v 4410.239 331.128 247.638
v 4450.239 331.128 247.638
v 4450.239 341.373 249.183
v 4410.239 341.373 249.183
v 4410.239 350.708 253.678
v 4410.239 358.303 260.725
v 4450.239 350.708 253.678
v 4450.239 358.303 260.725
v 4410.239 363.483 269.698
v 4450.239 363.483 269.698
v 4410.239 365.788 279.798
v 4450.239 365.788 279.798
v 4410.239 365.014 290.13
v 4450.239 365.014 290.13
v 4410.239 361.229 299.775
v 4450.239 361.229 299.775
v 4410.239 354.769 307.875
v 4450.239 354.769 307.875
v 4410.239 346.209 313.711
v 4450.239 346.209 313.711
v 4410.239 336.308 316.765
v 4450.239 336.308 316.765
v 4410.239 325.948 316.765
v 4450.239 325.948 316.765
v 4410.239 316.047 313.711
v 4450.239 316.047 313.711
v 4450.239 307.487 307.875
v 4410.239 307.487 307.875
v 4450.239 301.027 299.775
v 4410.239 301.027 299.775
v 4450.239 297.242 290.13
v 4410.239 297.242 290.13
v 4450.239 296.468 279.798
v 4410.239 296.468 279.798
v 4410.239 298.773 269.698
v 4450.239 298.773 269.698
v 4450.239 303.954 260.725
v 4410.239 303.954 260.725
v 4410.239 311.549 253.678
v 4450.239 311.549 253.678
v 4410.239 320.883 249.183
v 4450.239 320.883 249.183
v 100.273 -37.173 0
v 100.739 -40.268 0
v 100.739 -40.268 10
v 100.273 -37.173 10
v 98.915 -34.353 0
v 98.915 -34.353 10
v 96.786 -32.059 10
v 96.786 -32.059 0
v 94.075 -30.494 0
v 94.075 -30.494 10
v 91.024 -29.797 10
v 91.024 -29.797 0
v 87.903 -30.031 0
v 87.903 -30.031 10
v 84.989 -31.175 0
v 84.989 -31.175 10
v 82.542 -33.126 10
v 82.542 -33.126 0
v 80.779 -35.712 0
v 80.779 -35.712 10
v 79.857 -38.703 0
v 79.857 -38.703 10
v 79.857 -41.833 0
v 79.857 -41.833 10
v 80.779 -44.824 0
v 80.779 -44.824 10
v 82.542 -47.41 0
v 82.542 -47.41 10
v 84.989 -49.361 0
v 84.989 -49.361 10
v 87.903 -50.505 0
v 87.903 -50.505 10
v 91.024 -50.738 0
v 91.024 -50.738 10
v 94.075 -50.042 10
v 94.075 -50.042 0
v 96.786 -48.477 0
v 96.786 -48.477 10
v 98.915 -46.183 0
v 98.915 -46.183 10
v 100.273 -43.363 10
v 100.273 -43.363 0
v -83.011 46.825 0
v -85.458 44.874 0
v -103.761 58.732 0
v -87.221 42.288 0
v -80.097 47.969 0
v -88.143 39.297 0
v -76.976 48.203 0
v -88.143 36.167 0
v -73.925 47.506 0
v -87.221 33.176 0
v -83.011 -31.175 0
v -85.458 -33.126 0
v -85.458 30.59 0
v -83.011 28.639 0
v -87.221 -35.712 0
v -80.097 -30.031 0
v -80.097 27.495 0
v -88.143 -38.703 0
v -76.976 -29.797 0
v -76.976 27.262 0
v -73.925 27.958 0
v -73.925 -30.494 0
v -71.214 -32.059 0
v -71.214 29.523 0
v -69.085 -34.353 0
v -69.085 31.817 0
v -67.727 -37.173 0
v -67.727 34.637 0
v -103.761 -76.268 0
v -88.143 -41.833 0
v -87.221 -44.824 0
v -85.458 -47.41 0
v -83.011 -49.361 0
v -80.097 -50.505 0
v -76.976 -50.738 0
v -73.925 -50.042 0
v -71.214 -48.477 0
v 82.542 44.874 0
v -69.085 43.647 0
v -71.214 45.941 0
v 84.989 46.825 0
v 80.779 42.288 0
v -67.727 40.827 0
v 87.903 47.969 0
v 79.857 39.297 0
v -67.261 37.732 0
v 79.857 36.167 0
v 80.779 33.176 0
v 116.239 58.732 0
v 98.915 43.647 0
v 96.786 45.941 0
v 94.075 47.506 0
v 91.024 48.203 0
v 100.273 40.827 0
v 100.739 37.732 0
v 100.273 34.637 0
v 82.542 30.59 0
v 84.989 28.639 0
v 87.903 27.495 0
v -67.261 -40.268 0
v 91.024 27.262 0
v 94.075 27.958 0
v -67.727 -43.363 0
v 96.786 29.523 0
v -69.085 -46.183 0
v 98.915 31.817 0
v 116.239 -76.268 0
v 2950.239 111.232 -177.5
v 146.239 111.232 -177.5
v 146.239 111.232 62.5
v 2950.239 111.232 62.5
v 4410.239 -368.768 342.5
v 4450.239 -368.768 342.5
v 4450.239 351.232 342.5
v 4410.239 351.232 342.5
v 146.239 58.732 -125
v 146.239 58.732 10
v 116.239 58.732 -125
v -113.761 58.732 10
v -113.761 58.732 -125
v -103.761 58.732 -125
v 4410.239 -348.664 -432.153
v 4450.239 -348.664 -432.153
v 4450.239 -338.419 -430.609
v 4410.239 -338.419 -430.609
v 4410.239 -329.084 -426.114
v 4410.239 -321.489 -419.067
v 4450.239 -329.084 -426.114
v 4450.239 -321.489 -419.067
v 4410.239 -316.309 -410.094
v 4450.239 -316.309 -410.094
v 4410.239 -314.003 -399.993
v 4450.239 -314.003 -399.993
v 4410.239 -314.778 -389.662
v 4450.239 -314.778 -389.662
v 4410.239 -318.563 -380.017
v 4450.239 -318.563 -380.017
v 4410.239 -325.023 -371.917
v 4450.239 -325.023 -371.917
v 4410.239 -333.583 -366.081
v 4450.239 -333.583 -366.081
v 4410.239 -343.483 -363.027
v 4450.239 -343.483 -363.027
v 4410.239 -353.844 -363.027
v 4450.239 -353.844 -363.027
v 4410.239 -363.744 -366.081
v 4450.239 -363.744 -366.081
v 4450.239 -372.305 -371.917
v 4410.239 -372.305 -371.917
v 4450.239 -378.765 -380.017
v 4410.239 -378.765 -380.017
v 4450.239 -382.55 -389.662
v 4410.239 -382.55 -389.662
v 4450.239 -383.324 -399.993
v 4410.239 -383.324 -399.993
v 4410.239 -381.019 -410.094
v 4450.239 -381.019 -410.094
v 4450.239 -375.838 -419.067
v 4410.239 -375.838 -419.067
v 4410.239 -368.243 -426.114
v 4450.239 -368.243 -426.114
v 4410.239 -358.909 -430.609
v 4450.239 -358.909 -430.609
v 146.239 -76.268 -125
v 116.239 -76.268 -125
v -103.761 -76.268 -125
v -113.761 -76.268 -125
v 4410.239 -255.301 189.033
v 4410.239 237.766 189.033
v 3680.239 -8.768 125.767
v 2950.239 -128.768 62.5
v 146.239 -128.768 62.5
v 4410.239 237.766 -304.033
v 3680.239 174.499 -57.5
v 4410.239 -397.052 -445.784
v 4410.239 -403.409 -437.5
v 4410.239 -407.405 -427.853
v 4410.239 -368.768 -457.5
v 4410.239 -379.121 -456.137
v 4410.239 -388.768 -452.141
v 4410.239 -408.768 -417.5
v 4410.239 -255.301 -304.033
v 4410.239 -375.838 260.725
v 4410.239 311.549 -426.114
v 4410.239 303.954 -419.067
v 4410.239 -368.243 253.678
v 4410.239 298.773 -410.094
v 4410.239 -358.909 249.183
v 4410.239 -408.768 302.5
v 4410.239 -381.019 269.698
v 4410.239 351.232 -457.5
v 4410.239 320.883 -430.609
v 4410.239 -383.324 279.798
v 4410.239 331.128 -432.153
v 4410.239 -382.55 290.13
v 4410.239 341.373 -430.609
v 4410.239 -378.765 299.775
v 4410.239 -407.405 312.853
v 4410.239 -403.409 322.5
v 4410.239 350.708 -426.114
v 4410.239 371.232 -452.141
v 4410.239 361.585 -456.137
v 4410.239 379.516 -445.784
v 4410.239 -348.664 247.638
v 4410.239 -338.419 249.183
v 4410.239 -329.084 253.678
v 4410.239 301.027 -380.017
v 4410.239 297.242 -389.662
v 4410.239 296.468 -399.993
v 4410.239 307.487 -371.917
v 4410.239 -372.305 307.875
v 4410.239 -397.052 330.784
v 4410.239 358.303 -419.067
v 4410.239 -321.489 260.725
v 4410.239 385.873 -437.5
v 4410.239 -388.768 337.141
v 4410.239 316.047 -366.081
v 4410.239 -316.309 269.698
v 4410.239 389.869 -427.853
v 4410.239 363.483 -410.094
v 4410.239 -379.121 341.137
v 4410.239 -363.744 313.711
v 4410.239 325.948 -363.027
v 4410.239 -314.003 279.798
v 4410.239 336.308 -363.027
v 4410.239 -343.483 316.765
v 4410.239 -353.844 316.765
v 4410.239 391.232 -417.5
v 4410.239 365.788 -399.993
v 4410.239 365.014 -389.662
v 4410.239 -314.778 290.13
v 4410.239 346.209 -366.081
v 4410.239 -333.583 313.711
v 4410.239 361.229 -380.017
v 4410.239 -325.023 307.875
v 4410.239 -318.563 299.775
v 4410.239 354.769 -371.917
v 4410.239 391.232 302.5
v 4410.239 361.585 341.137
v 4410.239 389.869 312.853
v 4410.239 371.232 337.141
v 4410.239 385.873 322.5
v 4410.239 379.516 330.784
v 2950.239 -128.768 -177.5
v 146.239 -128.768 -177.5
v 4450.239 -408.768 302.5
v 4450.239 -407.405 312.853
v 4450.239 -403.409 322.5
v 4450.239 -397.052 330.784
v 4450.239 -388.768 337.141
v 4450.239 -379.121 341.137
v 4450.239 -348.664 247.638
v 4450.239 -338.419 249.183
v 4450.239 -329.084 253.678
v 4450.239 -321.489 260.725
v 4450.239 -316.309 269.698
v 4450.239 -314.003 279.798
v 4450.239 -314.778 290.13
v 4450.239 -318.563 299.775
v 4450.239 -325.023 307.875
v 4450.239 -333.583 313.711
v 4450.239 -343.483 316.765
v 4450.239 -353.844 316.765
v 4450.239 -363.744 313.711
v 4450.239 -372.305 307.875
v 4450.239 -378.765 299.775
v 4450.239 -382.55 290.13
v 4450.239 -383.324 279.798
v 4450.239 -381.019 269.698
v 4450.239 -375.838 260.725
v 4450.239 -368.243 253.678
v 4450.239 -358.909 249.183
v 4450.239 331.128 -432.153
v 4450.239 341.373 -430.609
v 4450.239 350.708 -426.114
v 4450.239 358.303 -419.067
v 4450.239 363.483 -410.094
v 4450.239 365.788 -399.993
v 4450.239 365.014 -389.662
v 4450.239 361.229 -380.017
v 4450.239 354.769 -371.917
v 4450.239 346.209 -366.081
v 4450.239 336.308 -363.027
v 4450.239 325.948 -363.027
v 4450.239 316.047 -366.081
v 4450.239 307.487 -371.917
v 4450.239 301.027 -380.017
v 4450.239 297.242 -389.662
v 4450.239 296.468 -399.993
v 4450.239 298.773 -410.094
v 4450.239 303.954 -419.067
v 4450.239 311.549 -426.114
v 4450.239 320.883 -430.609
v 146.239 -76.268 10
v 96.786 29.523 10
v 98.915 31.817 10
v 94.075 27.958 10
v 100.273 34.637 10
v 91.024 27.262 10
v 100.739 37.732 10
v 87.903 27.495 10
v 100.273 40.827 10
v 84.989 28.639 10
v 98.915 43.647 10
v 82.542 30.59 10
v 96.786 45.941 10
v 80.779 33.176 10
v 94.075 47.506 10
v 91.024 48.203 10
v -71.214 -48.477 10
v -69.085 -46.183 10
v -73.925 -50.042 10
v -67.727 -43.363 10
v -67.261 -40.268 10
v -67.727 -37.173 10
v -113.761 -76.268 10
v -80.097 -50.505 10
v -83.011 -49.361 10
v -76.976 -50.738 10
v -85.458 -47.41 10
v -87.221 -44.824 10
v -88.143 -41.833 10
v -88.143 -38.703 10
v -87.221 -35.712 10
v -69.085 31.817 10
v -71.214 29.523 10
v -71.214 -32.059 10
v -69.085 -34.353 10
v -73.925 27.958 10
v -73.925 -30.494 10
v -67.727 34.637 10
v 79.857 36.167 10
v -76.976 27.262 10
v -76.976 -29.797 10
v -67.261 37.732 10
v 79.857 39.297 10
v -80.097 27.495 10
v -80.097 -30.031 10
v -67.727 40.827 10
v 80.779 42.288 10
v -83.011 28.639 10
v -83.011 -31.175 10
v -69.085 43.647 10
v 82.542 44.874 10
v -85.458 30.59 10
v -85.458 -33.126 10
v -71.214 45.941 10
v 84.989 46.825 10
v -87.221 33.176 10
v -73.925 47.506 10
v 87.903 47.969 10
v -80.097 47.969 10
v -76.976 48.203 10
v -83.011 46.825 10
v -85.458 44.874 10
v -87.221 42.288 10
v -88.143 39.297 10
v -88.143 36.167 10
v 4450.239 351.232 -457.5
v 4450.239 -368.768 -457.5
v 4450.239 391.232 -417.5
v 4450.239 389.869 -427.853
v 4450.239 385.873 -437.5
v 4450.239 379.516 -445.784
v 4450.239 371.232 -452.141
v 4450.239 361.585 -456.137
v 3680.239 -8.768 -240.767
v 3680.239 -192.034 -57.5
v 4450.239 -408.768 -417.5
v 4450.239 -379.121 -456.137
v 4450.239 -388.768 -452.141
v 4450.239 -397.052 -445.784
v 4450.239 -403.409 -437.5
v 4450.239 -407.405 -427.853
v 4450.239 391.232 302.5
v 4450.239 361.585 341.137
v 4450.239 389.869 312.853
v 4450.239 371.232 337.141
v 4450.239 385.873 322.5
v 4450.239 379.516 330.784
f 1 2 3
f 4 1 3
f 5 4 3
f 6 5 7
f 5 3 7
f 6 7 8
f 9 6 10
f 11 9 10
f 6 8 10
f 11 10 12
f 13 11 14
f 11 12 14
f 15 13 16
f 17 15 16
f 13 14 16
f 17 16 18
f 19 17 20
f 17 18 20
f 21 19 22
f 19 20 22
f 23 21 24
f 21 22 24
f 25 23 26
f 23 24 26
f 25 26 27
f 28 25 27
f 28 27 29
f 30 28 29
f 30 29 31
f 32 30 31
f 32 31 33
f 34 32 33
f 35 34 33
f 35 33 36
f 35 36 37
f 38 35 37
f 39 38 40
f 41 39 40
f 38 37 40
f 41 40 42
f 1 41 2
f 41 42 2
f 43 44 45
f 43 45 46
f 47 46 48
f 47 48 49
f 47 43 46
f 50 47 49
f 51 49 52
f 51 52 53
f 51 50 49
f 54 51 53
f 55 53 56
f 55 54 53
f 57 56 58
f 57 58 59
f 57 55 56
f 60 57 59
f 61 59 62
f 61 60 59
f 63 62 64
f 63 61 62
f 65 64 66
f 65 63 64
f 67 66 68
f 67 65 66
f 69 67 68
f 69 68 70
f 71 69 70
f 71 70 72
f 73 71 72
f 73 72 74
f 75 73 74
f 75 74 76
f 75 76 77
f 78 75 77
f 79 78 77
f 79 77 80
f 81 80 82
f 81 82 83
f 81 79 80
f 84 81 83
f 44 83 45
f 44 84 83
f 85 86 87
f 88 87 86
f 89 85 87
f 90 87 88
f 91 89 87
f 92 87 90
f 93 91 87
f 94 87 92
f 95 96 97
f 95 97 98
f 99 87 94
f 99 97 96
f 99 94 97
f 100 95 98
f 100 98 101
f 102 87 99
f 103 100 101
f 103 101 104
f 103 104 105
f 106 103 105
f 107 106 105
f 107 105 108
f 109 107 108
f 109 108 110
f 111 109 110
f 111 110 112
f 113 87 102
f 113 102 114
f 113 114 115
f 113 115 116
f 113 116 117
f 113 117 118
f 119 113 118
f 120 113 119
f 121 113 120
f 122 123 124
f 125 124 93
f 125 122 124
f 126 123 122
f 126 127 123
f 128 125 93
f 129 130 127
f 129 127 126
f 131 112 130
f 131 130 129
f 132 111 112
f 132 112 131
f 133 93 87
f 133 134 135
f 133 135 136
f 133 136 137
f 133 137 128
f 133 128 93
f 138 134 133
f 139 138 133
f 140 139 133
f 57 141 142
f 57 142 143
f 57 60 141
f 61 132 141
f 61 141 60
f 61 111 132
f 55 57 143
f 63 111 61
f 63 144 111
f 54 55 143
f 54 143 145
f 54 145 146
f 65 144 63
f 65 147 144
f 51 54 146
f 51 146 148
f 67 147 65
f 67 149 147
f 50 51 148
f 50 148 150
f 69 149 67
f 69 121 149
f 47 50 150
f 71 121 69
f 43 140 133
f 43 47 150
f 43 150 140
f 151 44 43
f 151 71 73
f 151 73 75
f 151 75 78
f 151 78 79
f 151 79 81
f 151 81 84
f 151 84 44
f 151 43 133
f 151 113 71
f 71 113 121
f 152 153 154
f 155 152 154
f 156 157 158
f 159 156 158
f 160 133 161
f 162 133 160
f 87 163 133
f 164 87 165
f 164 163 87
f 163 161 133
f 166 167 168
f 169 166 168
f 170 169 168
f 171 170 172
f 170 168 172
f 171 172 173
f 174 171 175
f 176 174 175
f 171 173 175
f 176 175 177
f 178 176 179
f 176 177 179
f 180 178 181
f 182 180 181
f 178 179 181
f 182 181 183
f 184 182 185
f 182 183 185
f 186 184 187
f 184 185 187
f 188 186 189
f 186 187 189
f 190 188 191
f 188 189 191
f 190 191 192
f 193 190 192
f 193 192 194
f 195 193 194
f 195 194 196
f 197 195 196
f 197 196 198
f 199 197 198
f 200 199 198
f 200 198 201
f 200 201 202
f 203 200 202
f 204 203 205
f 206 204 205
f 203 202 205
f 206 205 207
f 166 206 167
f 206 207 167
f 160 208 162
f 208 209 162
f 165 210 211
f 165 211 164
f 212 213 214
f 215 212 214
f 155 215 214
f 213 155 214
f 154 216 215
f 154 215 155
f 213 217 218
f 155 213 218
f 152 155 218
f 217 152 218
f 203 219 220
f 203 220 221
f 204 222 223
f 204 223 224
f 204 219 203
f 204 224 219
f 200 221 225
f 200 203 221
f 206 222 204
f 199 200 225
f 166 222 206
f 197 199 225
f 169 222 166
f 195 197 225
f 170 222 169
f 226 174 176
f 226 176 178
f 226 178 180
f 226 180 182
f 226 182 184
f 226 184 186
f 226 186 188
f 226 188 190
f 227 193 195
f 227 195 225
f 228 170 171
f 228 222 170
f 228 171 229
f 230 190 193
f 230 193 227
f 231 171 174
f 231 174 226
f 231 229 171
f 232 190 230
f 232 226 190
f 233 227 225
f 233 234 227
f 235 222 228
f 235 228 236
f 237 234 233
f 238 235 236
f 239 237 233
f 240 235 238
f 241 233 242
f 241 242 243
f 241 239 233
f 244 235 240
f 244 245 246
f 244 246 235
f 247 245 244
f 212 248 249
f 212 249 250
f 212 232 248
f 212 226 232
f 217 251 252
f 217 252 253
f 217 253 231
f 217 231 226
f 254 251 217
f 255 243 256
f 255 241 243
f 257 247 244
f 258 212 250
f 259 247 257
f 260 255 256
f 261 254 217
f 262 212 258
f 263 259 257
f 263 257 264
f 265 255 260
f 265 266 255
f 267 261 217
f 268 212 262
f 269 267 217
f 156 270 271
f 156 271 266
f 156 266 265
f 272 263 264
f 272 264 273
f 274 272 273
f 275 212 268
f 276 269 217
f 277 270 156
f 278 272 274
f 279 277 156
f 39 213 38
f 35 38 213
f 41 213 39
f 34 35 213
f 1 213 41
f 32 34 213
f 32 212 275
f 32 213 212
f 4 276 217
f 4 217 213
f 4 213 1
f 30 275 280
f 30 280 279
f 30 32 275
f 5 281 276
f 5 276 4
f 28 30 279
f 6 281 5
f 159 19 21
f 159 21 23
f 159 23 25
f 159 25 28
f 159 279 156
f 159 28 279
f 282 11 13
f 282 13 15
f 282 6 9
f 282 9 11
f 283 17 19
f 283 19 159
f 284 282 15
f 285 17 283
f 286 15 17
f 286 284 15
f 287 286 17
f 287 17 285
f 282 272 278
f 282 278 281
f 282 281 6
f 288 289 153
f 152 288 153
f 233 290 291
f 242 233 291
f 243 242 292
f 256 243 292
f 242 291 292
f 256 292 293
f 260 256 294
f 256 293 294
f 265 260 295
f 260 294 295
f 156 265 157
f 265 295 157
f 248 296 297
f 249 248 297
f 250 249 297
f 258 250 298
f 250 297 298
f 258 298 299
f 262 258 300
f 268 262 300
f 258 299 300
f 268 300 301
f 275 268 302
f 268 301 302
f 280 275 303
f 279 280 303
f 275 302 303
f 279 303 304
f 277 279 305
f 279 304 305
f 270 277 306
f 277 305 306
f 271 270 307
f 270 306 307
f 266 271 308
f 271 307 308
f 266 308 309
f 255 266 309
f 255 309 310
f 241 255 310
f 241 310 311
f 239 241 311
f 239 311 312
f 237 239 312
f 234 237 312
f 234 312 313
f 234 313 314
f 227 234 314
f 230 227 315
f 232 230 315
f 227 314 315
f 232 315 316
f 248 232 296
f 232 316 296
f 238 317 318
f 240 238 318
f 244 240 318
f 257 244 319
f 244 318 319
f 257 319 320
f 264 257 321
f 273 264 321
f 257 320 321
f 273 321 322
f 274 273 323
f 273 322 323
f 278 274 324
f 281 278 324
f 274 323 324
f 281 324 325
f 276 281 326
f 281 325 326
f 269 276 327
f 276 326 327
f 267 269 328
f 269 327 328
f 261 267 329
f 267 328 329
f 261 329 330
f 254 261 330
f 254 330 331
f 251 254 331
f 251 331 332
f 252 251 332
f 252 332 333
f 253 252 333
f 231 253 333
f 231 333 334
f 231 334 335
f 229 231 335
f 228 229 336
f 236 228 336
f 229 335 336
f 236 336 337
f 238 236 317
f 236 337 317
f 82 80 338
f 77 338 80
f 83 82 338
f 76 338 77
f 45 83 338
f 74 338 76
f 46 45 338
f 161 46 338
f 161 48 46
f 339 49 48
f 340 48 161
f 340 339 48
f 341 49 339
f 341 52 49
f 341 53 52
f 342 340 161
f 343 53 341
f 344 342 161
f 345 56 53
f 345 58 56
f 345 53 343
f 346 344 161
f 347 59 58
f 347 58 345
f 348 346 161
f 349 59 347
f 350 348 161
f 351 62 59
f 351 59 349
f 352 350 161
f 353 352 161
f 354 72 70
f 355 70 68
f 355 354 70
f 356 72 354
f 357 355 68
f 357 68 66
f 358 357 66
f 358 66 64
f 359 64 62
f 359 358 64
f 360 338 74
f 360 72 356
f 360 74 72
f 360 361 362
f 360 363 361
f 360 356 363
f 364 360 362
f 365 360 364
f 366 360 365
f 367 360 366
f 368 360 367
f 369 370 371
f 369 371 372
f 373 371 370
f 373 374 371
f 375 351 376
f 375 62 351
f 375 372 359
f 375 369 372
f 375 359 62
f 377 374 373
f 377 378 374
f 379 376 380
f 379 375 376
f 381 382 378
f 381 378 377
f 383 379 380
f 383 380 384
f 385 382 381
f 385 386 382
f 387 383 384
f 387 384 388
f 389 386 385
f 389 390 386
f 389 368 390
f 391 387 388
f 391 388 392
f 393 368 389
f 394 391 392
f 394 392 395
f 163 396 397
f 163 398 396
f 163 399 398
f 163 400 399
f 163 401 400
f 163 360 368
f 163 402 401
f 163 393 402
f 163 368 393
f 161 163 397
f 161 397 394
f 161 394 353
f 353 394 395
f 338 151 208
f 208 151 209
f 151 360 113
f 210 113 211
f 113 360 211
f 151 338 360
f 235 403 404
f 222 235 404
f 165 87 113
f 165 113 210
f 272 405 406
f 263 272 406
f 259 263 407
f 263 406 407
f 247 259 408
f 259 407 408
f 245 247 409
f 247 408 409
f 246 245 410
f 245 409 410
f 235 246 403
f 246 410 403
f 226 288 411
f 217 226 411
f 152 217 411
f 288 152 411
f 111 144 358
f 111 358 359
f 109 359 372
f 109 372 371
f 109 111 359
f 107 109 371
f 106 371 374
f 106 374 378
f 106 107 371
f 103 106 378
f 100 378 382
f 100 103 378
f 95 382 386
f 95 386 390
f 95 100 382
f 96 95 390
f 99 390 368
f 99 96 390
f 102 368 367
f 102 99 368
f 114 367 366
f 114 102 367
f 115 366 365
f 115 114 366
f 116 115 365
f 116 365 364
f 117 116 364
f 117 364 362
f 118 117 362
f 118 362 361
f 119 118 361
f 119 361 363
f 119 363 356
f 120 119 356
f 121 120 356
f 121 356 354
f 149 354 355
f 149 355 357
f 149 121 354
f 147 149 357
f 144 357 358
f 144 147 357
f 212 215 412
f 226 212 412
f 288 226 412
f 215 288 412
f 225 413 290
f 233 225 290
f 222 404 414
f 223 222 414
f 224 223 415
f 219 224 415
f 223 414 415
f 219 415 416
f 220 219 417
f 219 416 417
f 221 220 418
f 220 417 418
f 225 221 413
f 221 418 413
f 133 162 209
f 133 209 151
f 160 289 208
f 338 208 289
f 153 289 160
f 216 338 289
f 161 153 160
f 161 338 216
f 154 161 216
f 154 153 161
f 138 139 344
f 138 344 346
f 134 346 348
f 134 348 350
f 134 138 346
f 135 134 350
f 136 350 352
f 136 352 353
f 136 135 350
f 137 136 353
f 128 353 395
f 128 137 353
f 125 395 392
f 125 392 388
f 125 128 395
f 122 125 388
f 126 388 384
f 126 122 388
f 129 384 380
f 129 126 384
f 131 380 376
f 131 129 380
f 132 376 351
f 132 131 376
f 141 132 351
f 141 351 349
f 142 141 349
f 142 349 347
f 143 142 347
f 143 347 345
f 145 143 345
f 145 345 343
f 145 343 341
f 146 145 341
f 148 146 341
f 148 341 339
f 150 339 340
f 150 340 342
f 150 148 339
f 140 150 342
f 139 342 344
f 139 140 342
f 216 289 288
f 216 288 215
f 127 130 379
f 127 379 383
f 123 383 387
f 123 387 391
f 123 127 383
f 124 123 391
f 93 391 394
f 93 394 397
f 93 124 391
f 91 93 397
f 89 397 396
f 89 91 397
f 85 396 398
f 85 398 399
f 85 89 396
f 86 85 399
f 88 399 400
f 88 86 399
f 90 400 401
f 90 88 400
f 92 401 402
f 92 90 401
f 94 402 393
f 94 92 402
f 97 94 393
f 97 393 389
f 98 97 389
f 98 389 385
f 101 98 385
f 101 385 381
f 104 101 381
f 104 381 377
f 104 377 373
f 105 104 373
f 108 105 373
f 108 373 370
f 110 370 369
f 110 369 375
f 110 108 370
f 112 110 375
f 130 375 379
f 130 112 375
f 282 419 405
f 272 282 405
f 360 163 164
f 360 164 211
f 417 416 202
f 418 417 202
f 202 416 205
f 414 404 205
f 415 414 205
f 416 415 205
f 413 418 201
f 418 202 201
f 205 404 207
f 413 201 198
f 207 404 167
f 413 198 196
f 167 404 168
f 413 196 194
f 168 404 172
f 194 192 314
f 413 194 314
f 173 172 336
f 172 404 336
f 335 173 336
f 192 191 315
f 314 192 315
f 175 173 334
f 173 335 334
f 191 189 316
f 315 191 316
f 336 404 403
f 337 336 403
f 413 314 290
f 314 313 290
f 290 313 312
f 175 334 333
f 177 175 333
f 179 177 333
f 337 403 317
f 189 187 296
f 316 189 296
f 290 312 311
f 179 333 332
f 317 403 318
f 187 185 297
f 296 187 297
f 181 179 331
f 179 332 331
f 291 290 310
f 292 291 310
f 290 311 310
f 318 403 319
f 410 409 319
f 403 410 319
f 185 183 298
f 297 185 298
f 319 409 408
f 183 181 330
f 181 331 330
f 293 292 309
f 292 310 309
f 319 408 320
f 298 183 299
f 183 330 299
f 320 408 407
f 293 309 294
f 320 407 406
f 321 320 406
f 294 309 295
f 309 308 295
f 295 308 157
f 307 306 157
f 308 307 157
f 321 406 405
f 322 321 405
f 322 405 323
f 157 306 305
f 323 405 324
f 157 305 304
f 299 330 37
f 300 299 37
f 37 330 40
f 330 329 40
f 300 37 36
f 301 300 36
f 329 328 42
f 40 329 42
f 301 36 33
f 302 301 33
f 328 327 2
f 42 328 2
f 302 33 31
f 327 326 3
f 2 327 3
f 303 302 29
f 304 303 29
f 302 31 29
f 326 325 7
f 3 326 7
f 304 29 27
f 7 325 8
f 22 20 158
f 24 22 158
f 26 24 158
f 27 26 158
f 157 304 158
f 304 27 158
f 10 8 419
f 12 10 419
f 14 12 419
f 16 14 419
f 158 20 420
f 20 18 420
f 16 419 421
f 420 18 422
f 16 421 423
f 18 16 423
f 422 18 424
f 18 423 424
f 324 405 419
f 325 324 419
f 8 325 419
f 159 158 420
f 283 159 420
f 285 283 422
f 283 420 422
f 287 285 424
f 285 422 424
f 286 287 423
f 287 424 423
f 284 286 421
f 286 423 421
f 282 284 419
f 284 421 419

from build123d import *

# Parameters (mm, degrees)
SKETCH1_W            = 220
SKETCH1_H            = 130
SKETCH1_R            = 10.5
BOSS_EXTRUDE1_DEPTH  = 10
BOSS_EXTRUDE2_DEPTH  = 250
CUT_EXTRUDE1_DEPTH   = 5
SKETCH4_W            = 10
SKETCH4_H            = 135
BOSS_EXTRUDE3_DEPTH  = 250
SKETCH5_W            = 250
SKETCH5_H            = 135
BOSS_EXTRUDE4_DEPTH  = 2800
SKETCH8_W            = 115
SKETCH8_H            = 135
CUT_EXTRUDE2_DEPTH   = 10000
SKETCH12_W           = 170
SKETCH12_H           = 170
BOSS_EXTRUDE6_DEPTH  = 2800
CUT_EXTRUDE3_DEPTH   = 50
SKETCH15_W           = 170
SKETCH15_H           = 170
BOSS_EXTRUDE7_DEPTH  = 1524
SKETCH16_W           = 240
SKETCH16_H           = 240
BOSS_EXTRUDE8_DEPTH  = 4324
SKETCH17_W           = 240
SKETCH17_H           = 240
CUT_EXTRUDE4_DEPTH   = 20
SKETCH18_W           = 135
SKETCH18_H           = 135
BOSS_EXTRUDE9_DEPTH  = 20
SKETCH19_W           = 500
SKETCH19_H           = 500
SKETCH20_W           = 240
SKETCH20_H           = 240
SKETCH21_R           = 34.757471725
BOSS_EXTRUDE10_DEPTH = 40


with BuildPart() as part:
    # Sketch1 → Boss-Extrude1 (new body)
    with BuildSketch(Plane.XY):
        with Locations((6.239262286, -1.26777364)):
            Rectangle(SKETCH1_W, SKETCH1_H)
        with Locations((90.239262286, -40.26777364)):
            Circle(SKETCH1_R, mode=Mode.SUBTRACT)
        with Locations((-77.760737714, -40.26777364)):
            Circle(SKETCH1_R, mode=Mode.SUBTRACT)
        with Locations((-77.760737714, 37.73222636)):
            Circle(SKETCH1_R, mode=Mode.SUBTRACT)
        with Locations((90.239262286, 37.73222636)):
            Circle(SKETCH1_R, mode=Mode.SUBTRACT)
    extrude(amount=BOSS_EXTRUDE1_DEPTH)

    # Sketch2 → Boss-Extrude2 (add)
    with BuildSketch(Plane.XY.offset(10)):
        Polygon((-103.760737714, 63.73222636), (-113.760737714, 63.73222636), (-113.760737714, -66.26777364), (-113.760737714, -76.26777364), (116.239262286, -76.26777364), (116.239262286, -66.26777364), (-103.760737714, -66.26777364), align=None)
    extrude(amount=-BOSS_EXTRUDE2_DEPTH)

    # Sketch3 → Cut-Extrude1 (cut)
    with BuildSketch(Plane(origin=(0, 63.73222636, 0), x_dir=(1, 0, 0), z_dir=(0, 1, 0))):
        Polygon((116.239262286, 0), (-103.760737714, 0), (-103.760737714, 240), (-113.760737714, 240), (-113.760737714, -10), (116.239262286, -10), align=None)
    extrude(amount=-CUT_EXTRUDE1_DEPTH, mode=Mode.SUBTRACT)

    # Sketch4 → Boss-Extrude3 (add)
    with BuildSketch(Plane.XY.offset(10)):
        with Locations((121.239262286, -8.76777364)):
            Rectangle(SKETCH4_W, SKETCH4_H)
    extrude(amount=-BOSS_EXTRUDE3_DEPTH)


with BuildPart() as body_2:
    # Sketch5 → Boss-Extrude4 (new body)
    with BuildSketch(Plane(origin=(126.239262286, 0, 0), x_dir=(0, 0, -1), z_dir=(1, 0, 0))):
        with Locations((115, -8.76777364)):
            Rectangle(SKETCH5_W, SKETCH5_H)
    extrude(amount=BOSS_EXTRUDE4_DEPTH)


with BuildPart() as cut_extrude2_tool:
    # Sketch8 → Cut-Extrude2 (new body)
    with BuildSketch(Plane(origin=(2926.239262286, 0, 0), x_dir=(0, 0, -1), z_dir=(1, 0, 0))):
        with Locations((182.5, -8.76777364)):
            Rectangle(SKETCH8_W, SKETCH8_H)
    extrude(amount=-CUT_EXTRUDE2_DEPTH)


with BuildPart() as part_1:
    add(part.part)

    # Cut-Extrude2: cut by cut_extrude2_tool
    add(cut_extrude2_tool.part, mode=Mode.SUBTRACT)



with BuildPart() as body_2_1:
    add(body_2.part)

    # Cut-Extrude2: cut by cut_extrude2_tool
    add(cut_extrude2_tool.part, mode=Mode.SUBTRACT)


with BuildPart() as part_2:
    add(part_1.part)

    add(body_2_1.part)  # Boss-Extrude6 merges body 2
    # Sketch12 → Boss-Extrude6 (add)
    with BuildSketch(Plane(origin=(2926.239262286, 0, 0), x_dir=(0, 0, -1), z_dir=(1, 0, 0))):
        with Locations((57.5, -8.76777364)):
            Rectangle(SKETCH12_W, SKETCH12_H)
    extrude(amount=-BOSS_EXTRUDE6_DEPTH)

    # Sketch14 → Cut-Extrude3 (cut)
    with BuildSketch(Plane.XZ.offset(76.26777364)):
        Polygon((-103.760737714, 0), (116.239262286, 0), (116.239262286, -115), (116.239262286, -125), (-103.760737714, -125), (-103.760737714, -115), align=None)
    extrude(amount=-CUT_EXTRUDE3_DEPTH, mode=Mode.SUBTRACT)

    # Sketch15 → Boss-Extrude7 (add)
    with BuildSketch(Plane(origin=(2926.239262286, 0, 0), x_dir=(0, 0, -1), z_dir=(1, 0, 0))):
        with Locations((57.5, -8.76777364)):
            Rectangle(SKETCH15_W, SKETCH15_H)
    extrude(amount=BOSS_EXTRUDE7_DEPTH)

    # Sketch16 → Boss-Extrude8 (add)
    with BuildSketch(Plane.ZY.offset(-126.239262286)):
        with Locations((-57.5, -8.76777364)):
            Rectangle(SKETCH16_W, SKETCH16_H)
    extrude(amount=-BOSS_EXTRUDE8_DEPTH)

    # Sketch17 → Cut-Extrude4 (cut)
    with BuildSketch(Plane.ZY.offset(-126.239262286)):
        with Locations((-57.5, -8.76777364)):
            Rectangle(SKETCH17_W, SKETCH17_H)
    extrude(amount=-CUT_EXTRUDE4_DEPTH, mode=Mode.SUBTRACT)

    # Sketch18 → Boss-Extrude9 (add)
    with BuildSketch(Plane(origin=(126.239262286, 0, 0), x_dir=(0, 0, -1), z_dir=(1, 0, 0))):
        with Locations((57.5, -8.76777364)):
            Rectangle(SKETCH18_W, SKETCH18_H)
    extrude(amount=BOSS_EXTRUDE9_DEPTH)

    # Sketch19 → Loft1 section 0
    with BuildSketch(Plane(origin=(4450.239262286, 0, 0), x_dir=(0, 0, -1), z_dir=(1, 0, 0))):
        with Locations((57.5, -8.76777364)):
            Rectangle(SKETCH19_W, SKETCH19_H)
    # Sketch20 → Loft1 section 1
    with BuildSketch(Plane(origin=(2950.239262286, 0, 0), x_dir=(0, 0, -1), z_dir=(1, 0, 0))):
        with Locations((57.5, -8.76777364)):
            Rectangle(SKETCH20_W, SKETCH20_H)
    loft()

    # Sketch21 → Boss-Extrude10 (add)
    with BuildSketch(Plane(origin=(4450.239262286, 0, 0), x_dir=(0, 0, -1), z_dir=(1, 0, 0))):
        with BuildLine():
            Line((417.5, -408.76777364), (-302.5, -408.76777364))
            ThreePointArc((-302.5, -408.76777364), (-330.784271247, -397.052044888), (-342.5, -368.76777364))
            Line((-342.5, -368.76777364), (-342.5, 351.23222636))
            ThreePointArc((-342.5, 351.23222636), (-330.784271247, 379.516497607), (-302.5, 391.23222636))
            Line((-302.5, 391.23222636), (417.5, 391.23222636))
            ThreePointArc((417.5, 391.23222636), (445.784271247, 379.516497607), (457.5, 351.23222636))
            Line((457.5, 351.23222636), (457.5, -368.76777364))
            ThreePointArc((457.5, -368.76777364), (445.784271247, -397.052044888), (417.5, -408.76777364))
        make_face()
        with Locations((397.395923599, -348.663697239)):
            Circle(SKETCH21_R, mode=Mode.SUBTRACT)
        with Locations((-282.395923599, -348.663697239)):
            Circle(SKETCH21_R, mode=Mode.SUBTRACT)
        with Locations((-282.395923599, 331.128149959)):
            Circle(SKETCH21_R, mode=Mode.SUBTRACT)
        with Locations((397.395923599, 331.128149959)):
            Circle(SKETCH21_R, mode=Mode.SUBTRACT)
    extrude(amount=-BOSS_EXTRUDE10_DEPTH)


solid = part_2.part
